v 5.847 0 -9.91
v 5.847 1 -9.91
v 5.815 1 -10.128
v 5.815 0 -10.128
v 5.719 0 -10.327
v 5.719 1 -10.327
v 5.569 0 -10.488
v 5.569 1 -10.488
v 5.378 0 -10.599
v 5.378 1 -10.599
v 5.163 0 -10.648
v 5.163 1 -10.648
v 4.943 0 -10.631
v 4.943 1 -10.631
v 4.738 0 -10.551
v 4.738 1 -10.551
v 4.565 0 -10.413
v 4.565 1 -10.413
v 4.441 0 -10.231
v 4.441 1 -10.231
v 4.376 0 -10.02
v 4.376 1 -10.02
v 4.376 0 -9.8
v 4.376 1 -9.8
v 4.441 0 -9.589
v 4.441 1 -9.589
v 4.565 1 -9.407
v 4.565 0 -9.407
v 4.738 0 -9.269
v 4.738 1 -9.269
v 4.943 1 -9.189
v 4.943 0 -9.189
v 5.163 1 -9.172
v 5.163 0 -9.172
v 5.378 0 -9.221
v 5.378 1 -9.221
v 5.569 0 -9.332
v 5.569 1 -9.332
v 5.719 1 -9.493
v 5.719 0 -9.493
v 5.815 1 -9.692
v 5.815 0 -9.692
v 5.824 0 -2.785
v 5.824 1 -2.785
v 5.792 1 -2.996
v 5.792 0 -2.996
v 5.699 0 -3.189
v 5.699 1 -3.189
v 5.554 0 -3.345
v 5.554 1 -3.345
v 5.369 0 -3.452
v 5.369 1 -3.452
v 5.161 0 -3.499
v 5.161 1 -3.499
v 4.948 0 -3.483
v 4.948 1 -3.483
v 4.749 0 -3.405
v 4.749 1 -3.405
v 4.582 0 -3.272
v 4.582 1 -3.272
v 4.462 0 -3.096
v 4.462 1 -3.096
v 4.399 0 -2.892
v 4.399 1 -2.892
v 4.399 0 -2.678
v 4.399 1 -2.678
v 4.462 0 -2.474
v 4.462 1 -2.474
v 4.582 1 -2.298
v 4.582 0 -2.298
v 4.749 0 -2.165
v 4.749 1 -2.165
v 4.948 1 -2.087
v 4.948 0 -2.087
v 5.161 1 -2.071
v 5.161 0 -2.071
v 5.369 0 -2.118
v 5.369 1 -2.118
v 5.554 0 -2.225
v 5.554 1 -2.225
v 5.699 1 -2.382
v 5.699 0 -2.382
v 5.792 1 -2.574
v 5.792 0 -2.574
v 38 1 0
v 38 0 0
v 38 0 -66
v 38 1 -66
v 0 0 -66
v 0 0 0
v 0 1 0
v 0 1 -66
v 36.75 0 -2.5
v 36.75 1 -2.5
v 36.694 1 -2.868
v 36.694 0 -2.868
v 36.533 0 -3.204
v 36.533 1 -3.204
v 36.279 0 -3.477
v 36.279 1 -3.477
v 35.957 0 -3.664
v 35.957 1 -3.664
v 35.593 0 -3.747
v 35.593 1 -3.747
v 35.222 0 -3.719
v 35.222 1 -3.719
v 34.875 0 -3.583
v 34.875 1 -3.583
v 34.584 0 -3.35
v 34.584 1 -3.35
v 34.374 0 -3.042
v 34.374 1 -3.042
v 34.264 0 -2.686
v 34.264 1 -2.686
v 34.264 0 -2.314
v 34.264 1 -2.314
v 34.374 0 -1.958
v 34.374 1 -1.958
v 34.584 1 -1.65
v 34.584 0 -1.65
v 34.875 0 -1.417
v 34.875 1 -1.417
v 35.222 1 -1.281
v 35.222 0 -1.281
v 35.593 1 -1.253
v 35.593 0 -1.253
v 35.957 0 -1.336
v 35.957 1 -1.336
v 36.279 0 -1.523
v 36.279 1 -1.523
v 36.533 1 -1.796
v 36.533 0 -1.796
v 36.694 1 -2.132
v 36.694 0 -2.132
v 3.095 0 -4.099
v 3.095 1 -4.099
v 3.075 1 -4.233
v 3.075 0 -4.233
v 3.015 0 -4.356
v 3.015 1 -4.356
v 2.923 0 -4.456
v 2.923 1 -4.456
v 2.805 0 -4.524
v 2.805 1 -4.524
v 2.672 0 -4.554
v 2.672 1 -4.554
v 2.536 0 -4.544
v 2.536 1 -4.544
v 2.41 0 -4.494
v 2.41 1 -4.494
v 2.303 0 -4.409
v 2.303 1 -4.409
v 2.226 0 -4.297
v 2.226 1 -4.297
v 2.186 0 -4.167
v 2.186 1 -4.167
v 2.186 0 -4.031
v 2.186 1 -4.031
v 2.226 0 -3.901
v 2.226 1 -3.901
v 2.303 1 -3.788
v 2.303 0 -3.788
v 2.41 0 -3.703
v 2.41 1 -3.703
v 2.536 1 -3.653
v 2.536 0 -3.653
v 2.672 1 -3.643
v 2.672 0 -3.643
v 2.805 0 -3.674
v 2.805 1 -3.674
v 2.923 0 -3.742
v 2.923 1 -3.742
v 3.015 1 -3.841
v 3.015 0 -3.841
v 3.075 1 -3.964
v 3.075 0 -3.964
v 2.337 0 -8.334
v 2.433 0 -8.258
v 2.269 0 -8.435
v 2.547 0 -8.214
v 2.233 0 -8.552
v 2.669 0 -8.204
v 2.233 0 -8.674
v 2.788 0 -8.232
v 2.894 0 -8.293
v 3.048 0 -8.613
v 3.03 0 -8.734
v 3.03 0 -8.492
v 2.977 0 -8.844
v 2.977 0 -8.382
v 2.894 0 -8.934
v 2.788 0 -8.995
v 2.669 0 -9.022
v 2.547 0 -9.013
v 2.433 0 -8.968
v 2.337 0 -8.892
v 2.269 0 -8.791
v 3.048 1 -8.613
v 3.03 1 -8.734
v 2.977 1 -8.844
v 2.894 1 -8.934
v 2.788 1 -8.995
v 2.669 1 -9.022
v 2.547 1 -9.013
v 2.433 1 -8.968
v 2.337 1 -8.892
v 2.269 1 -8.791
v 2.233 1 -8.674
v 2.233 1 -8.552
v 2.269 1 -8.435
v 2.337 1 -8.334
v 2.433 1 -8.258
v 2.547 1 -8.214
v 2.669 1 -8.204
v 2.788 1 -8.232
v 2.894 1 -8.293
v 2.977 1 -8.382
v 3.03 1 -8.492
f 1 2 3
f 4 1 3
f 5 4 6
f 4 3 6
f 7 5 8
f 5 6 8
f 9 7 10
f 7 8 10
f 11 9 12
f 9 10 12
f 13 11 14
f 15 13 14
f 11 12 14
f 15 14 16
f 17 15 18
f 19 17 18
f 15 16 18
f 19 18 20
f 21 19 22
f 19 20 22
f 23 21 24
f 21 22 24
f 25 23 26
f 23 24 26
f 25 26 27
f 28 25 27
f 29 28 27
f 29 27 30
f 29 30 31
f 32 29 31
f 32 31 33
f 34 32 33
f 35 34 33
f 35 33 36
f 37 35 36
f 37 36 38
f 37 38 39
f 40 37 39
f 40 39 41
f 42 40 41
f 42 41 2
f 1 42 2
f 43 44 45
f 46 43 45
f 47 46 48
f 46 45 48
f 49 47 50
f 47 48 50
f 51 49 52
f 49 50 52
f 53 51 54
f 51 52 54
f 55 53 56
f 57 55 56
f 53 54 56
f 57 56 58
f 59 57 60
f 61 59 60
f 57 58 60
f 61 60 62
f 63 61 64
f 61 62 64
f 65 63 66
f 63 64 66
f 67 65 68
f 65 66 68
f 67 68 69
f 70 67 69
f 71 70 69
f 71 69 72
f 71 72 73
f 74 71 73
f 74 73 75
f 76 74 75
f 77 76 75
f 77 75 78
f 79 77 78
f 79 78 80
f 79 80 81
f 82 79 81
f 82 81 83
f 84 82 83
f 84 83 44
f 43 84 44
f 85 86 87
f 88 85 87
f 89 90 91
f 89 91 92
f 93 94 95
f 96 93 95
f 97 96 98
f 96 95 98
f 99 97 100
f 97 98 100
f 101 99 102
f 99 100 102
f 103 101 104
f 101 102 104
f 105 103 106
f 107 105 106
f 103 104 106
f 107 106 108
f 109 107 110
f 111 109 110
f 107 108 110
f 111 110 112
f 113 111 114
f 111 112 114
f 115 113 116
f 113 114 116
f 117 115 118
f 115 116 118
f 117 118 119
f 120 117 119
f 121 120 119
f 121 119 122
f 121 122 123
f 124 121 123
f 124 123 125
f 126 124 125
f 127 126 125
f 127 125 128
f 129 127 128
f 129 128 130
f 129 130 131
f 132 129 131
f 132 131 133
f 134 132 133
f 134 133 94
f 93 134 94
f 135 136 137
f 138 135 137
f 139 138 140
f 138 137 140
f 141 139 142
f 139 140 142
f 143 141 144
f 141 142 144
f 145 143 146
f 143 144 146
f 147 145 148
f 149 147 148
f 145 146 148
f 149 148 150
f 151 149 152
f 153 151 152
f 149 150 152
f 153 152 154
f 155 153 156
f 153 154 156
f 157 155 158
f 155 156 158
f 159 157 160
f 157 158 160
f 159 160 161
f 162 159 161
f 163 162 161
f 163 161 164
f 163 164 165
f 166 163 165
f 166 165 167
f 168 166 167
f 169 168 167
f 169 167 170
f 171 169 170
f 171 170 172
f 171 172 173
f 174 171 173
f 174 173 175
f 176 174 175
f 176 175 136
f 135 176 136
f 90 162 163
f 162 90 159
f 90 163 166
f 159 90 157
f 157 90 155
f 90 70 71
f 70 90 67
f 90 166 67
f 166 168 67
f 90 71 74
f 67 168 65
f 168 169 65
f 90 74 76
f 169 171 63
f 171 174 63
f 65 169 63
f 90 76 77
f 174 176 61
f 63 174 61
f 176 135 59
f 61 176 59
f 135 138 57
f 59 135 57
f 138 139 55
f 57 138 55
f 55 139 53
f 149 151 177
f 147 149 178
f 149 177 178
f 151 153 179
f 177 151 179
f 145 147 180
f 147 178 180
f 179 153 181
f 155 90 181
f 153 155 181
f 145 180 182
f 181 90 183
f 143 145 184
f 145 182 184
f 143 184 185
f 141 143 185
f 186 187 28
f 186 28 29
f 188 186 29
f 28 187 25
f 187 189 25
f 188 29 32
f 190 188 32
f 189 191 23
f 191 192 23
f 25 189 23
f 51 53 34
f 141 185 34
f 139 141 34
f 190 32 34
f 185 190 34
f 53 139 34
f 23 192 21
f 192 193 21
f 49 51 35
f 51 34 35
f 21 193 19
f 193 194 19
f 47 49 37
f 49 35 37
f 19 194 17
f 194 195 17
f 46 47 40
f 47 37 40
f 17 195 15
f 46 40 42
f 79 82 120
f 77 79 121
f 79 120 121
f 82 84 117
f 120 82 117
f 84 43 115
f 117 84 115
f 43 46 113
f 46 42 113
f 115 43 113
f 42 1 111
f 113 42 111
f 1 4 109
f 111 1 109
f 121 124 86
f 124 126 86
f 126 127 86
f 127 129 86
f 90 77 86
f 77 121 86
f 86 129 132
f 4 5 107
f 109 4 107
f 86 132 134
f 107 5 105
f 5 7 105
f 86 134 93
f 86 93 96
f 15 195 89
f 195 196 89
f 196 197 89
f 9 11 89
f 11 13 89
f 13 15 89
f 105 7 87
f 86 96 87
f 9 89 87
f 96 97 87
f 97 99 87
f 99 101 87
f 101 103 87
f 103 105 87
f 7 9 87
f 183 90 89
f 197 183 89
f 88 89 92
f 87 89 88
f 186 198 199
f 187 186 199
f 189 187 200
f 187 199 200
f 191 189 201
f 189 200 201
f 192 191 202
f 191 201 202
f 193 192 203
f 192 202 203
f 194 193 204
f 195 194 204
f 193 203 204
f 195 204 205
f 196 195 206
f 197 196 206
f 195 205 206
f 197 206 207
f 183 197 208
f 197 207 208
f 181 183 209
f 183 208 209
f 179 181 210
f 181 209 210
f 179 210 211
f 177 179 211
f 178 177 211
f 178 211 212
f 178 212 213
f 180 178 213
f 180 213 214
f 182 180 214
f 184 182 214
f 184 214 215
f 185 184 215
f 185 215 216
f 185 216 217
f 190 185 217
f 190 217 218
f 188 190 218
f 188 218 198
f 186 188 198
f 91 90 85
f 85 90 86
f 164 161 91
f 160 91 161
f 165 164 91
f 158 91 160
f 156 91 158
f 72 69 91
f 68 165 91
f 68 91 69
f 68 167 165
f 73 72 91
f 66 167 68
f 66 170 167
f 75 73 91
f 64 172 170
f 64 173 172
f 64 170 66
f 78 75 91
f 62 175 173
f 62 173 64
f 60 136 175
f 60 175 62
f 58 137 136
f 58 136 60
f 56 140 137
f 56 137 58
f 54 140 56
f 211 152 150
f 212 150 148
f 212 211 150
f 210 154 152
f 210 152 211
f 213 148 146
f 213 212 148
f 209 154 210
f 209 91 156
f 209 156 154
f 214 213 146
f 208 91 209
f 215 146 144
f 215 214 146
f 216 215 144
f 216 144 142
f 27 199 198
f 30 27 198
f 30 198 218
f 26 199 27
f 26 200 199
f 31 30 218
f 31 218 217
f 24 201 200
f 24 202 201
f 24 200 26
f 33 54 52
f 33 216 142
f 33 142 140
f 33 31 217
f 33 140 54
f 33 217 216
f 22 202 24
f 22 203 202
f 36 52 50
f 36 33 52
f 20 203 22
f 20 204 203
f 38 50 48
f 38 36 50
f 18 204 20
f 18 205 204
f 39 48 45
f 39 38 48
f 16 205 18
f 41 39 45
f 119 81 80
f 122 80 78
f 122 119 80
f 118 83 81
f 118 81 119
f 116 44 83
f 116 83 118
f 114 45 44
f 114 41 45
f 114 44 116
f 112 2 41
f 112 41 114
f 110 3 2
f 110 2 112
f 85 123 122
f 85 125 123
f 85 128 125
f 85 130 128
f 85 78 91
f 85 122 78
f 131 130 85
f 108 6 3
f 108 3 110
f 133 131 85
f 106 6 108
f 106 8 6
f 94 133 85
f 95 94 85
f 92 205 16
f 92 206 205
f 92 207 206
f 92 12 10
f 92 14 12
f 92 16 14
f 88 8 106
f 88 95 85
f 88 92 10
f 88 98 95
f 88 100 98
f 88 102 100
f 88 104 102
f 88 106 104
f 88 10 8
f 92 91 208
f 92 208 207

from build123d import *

# Parameters (mm, degrees)
SKETCH1_W           = 38
SKETCH1_H           = 66
BOSS_EXTRUDE1_DEPTH = 1
SKETCH2_R           = 1.25
CUT_EXTRUDE1_DEPTH  = 2
SKETCH3_R           = 0.456831937
SKETCH3_R_2         = 0.409961783
SKETCH3_R_3         = 0.739914173
SKETCH3_R_4         = 0.716276255
CUT_EXTRUDE2_DEPTH  = 2


with BuildPart() as part:
    # Sketch1 → Boss-Extrude1 (new body)
    with BuildSketch(Plane(origin=(0, 0, 0), x_dir=(1, 0, 0), z_dir=(0, 1, 0))):
        with Locations((19, 33)):
            Rectangle(SKETCH1_W, SKETCH1_H)
    extrude(amount=BOSS_EXTRUDE1_DEPTH)

    # Sketch2 → Cut-Extrude1 (cut, through all)
    with BuildSketch(Plane(origin=(0, 1, 0), x_dir=(1, 0, 0), z_dir=(0, 1, 0))):
        with Locations((35.5, 2.5)):
            Circle(SKETCH2_R)
    extrude(amount=-CUT_EXTRUDE1_DEPTH, mode=Mode.SUBTRACT)

    # Sketch3 → Cut-Extrude2 (cut, through all)
    with BuildSketch(Plane(origin=(0, 1, 0), x_dir=(1, 0, 0), z_dir=(0, 1, 0))):
        with Locations((2.638016887, 4.098772659)):
            Circle(SKETCH3_R)
        with Locations((2.638016887, 8.613282996)):
            Circle(SKETCH3_R_2)
        with Locations((5.107560434, 9.90998851)):
            Circle(SKETCH3_R_3)
        with Locations((5.107560434, 2.785166116)):
            Circle(SKETCH3_R_4)
    extrude(amount=-CUT_EXTRUDE2_DEPTH, mode=Mode.SUBTRACT)


solid = part.part
